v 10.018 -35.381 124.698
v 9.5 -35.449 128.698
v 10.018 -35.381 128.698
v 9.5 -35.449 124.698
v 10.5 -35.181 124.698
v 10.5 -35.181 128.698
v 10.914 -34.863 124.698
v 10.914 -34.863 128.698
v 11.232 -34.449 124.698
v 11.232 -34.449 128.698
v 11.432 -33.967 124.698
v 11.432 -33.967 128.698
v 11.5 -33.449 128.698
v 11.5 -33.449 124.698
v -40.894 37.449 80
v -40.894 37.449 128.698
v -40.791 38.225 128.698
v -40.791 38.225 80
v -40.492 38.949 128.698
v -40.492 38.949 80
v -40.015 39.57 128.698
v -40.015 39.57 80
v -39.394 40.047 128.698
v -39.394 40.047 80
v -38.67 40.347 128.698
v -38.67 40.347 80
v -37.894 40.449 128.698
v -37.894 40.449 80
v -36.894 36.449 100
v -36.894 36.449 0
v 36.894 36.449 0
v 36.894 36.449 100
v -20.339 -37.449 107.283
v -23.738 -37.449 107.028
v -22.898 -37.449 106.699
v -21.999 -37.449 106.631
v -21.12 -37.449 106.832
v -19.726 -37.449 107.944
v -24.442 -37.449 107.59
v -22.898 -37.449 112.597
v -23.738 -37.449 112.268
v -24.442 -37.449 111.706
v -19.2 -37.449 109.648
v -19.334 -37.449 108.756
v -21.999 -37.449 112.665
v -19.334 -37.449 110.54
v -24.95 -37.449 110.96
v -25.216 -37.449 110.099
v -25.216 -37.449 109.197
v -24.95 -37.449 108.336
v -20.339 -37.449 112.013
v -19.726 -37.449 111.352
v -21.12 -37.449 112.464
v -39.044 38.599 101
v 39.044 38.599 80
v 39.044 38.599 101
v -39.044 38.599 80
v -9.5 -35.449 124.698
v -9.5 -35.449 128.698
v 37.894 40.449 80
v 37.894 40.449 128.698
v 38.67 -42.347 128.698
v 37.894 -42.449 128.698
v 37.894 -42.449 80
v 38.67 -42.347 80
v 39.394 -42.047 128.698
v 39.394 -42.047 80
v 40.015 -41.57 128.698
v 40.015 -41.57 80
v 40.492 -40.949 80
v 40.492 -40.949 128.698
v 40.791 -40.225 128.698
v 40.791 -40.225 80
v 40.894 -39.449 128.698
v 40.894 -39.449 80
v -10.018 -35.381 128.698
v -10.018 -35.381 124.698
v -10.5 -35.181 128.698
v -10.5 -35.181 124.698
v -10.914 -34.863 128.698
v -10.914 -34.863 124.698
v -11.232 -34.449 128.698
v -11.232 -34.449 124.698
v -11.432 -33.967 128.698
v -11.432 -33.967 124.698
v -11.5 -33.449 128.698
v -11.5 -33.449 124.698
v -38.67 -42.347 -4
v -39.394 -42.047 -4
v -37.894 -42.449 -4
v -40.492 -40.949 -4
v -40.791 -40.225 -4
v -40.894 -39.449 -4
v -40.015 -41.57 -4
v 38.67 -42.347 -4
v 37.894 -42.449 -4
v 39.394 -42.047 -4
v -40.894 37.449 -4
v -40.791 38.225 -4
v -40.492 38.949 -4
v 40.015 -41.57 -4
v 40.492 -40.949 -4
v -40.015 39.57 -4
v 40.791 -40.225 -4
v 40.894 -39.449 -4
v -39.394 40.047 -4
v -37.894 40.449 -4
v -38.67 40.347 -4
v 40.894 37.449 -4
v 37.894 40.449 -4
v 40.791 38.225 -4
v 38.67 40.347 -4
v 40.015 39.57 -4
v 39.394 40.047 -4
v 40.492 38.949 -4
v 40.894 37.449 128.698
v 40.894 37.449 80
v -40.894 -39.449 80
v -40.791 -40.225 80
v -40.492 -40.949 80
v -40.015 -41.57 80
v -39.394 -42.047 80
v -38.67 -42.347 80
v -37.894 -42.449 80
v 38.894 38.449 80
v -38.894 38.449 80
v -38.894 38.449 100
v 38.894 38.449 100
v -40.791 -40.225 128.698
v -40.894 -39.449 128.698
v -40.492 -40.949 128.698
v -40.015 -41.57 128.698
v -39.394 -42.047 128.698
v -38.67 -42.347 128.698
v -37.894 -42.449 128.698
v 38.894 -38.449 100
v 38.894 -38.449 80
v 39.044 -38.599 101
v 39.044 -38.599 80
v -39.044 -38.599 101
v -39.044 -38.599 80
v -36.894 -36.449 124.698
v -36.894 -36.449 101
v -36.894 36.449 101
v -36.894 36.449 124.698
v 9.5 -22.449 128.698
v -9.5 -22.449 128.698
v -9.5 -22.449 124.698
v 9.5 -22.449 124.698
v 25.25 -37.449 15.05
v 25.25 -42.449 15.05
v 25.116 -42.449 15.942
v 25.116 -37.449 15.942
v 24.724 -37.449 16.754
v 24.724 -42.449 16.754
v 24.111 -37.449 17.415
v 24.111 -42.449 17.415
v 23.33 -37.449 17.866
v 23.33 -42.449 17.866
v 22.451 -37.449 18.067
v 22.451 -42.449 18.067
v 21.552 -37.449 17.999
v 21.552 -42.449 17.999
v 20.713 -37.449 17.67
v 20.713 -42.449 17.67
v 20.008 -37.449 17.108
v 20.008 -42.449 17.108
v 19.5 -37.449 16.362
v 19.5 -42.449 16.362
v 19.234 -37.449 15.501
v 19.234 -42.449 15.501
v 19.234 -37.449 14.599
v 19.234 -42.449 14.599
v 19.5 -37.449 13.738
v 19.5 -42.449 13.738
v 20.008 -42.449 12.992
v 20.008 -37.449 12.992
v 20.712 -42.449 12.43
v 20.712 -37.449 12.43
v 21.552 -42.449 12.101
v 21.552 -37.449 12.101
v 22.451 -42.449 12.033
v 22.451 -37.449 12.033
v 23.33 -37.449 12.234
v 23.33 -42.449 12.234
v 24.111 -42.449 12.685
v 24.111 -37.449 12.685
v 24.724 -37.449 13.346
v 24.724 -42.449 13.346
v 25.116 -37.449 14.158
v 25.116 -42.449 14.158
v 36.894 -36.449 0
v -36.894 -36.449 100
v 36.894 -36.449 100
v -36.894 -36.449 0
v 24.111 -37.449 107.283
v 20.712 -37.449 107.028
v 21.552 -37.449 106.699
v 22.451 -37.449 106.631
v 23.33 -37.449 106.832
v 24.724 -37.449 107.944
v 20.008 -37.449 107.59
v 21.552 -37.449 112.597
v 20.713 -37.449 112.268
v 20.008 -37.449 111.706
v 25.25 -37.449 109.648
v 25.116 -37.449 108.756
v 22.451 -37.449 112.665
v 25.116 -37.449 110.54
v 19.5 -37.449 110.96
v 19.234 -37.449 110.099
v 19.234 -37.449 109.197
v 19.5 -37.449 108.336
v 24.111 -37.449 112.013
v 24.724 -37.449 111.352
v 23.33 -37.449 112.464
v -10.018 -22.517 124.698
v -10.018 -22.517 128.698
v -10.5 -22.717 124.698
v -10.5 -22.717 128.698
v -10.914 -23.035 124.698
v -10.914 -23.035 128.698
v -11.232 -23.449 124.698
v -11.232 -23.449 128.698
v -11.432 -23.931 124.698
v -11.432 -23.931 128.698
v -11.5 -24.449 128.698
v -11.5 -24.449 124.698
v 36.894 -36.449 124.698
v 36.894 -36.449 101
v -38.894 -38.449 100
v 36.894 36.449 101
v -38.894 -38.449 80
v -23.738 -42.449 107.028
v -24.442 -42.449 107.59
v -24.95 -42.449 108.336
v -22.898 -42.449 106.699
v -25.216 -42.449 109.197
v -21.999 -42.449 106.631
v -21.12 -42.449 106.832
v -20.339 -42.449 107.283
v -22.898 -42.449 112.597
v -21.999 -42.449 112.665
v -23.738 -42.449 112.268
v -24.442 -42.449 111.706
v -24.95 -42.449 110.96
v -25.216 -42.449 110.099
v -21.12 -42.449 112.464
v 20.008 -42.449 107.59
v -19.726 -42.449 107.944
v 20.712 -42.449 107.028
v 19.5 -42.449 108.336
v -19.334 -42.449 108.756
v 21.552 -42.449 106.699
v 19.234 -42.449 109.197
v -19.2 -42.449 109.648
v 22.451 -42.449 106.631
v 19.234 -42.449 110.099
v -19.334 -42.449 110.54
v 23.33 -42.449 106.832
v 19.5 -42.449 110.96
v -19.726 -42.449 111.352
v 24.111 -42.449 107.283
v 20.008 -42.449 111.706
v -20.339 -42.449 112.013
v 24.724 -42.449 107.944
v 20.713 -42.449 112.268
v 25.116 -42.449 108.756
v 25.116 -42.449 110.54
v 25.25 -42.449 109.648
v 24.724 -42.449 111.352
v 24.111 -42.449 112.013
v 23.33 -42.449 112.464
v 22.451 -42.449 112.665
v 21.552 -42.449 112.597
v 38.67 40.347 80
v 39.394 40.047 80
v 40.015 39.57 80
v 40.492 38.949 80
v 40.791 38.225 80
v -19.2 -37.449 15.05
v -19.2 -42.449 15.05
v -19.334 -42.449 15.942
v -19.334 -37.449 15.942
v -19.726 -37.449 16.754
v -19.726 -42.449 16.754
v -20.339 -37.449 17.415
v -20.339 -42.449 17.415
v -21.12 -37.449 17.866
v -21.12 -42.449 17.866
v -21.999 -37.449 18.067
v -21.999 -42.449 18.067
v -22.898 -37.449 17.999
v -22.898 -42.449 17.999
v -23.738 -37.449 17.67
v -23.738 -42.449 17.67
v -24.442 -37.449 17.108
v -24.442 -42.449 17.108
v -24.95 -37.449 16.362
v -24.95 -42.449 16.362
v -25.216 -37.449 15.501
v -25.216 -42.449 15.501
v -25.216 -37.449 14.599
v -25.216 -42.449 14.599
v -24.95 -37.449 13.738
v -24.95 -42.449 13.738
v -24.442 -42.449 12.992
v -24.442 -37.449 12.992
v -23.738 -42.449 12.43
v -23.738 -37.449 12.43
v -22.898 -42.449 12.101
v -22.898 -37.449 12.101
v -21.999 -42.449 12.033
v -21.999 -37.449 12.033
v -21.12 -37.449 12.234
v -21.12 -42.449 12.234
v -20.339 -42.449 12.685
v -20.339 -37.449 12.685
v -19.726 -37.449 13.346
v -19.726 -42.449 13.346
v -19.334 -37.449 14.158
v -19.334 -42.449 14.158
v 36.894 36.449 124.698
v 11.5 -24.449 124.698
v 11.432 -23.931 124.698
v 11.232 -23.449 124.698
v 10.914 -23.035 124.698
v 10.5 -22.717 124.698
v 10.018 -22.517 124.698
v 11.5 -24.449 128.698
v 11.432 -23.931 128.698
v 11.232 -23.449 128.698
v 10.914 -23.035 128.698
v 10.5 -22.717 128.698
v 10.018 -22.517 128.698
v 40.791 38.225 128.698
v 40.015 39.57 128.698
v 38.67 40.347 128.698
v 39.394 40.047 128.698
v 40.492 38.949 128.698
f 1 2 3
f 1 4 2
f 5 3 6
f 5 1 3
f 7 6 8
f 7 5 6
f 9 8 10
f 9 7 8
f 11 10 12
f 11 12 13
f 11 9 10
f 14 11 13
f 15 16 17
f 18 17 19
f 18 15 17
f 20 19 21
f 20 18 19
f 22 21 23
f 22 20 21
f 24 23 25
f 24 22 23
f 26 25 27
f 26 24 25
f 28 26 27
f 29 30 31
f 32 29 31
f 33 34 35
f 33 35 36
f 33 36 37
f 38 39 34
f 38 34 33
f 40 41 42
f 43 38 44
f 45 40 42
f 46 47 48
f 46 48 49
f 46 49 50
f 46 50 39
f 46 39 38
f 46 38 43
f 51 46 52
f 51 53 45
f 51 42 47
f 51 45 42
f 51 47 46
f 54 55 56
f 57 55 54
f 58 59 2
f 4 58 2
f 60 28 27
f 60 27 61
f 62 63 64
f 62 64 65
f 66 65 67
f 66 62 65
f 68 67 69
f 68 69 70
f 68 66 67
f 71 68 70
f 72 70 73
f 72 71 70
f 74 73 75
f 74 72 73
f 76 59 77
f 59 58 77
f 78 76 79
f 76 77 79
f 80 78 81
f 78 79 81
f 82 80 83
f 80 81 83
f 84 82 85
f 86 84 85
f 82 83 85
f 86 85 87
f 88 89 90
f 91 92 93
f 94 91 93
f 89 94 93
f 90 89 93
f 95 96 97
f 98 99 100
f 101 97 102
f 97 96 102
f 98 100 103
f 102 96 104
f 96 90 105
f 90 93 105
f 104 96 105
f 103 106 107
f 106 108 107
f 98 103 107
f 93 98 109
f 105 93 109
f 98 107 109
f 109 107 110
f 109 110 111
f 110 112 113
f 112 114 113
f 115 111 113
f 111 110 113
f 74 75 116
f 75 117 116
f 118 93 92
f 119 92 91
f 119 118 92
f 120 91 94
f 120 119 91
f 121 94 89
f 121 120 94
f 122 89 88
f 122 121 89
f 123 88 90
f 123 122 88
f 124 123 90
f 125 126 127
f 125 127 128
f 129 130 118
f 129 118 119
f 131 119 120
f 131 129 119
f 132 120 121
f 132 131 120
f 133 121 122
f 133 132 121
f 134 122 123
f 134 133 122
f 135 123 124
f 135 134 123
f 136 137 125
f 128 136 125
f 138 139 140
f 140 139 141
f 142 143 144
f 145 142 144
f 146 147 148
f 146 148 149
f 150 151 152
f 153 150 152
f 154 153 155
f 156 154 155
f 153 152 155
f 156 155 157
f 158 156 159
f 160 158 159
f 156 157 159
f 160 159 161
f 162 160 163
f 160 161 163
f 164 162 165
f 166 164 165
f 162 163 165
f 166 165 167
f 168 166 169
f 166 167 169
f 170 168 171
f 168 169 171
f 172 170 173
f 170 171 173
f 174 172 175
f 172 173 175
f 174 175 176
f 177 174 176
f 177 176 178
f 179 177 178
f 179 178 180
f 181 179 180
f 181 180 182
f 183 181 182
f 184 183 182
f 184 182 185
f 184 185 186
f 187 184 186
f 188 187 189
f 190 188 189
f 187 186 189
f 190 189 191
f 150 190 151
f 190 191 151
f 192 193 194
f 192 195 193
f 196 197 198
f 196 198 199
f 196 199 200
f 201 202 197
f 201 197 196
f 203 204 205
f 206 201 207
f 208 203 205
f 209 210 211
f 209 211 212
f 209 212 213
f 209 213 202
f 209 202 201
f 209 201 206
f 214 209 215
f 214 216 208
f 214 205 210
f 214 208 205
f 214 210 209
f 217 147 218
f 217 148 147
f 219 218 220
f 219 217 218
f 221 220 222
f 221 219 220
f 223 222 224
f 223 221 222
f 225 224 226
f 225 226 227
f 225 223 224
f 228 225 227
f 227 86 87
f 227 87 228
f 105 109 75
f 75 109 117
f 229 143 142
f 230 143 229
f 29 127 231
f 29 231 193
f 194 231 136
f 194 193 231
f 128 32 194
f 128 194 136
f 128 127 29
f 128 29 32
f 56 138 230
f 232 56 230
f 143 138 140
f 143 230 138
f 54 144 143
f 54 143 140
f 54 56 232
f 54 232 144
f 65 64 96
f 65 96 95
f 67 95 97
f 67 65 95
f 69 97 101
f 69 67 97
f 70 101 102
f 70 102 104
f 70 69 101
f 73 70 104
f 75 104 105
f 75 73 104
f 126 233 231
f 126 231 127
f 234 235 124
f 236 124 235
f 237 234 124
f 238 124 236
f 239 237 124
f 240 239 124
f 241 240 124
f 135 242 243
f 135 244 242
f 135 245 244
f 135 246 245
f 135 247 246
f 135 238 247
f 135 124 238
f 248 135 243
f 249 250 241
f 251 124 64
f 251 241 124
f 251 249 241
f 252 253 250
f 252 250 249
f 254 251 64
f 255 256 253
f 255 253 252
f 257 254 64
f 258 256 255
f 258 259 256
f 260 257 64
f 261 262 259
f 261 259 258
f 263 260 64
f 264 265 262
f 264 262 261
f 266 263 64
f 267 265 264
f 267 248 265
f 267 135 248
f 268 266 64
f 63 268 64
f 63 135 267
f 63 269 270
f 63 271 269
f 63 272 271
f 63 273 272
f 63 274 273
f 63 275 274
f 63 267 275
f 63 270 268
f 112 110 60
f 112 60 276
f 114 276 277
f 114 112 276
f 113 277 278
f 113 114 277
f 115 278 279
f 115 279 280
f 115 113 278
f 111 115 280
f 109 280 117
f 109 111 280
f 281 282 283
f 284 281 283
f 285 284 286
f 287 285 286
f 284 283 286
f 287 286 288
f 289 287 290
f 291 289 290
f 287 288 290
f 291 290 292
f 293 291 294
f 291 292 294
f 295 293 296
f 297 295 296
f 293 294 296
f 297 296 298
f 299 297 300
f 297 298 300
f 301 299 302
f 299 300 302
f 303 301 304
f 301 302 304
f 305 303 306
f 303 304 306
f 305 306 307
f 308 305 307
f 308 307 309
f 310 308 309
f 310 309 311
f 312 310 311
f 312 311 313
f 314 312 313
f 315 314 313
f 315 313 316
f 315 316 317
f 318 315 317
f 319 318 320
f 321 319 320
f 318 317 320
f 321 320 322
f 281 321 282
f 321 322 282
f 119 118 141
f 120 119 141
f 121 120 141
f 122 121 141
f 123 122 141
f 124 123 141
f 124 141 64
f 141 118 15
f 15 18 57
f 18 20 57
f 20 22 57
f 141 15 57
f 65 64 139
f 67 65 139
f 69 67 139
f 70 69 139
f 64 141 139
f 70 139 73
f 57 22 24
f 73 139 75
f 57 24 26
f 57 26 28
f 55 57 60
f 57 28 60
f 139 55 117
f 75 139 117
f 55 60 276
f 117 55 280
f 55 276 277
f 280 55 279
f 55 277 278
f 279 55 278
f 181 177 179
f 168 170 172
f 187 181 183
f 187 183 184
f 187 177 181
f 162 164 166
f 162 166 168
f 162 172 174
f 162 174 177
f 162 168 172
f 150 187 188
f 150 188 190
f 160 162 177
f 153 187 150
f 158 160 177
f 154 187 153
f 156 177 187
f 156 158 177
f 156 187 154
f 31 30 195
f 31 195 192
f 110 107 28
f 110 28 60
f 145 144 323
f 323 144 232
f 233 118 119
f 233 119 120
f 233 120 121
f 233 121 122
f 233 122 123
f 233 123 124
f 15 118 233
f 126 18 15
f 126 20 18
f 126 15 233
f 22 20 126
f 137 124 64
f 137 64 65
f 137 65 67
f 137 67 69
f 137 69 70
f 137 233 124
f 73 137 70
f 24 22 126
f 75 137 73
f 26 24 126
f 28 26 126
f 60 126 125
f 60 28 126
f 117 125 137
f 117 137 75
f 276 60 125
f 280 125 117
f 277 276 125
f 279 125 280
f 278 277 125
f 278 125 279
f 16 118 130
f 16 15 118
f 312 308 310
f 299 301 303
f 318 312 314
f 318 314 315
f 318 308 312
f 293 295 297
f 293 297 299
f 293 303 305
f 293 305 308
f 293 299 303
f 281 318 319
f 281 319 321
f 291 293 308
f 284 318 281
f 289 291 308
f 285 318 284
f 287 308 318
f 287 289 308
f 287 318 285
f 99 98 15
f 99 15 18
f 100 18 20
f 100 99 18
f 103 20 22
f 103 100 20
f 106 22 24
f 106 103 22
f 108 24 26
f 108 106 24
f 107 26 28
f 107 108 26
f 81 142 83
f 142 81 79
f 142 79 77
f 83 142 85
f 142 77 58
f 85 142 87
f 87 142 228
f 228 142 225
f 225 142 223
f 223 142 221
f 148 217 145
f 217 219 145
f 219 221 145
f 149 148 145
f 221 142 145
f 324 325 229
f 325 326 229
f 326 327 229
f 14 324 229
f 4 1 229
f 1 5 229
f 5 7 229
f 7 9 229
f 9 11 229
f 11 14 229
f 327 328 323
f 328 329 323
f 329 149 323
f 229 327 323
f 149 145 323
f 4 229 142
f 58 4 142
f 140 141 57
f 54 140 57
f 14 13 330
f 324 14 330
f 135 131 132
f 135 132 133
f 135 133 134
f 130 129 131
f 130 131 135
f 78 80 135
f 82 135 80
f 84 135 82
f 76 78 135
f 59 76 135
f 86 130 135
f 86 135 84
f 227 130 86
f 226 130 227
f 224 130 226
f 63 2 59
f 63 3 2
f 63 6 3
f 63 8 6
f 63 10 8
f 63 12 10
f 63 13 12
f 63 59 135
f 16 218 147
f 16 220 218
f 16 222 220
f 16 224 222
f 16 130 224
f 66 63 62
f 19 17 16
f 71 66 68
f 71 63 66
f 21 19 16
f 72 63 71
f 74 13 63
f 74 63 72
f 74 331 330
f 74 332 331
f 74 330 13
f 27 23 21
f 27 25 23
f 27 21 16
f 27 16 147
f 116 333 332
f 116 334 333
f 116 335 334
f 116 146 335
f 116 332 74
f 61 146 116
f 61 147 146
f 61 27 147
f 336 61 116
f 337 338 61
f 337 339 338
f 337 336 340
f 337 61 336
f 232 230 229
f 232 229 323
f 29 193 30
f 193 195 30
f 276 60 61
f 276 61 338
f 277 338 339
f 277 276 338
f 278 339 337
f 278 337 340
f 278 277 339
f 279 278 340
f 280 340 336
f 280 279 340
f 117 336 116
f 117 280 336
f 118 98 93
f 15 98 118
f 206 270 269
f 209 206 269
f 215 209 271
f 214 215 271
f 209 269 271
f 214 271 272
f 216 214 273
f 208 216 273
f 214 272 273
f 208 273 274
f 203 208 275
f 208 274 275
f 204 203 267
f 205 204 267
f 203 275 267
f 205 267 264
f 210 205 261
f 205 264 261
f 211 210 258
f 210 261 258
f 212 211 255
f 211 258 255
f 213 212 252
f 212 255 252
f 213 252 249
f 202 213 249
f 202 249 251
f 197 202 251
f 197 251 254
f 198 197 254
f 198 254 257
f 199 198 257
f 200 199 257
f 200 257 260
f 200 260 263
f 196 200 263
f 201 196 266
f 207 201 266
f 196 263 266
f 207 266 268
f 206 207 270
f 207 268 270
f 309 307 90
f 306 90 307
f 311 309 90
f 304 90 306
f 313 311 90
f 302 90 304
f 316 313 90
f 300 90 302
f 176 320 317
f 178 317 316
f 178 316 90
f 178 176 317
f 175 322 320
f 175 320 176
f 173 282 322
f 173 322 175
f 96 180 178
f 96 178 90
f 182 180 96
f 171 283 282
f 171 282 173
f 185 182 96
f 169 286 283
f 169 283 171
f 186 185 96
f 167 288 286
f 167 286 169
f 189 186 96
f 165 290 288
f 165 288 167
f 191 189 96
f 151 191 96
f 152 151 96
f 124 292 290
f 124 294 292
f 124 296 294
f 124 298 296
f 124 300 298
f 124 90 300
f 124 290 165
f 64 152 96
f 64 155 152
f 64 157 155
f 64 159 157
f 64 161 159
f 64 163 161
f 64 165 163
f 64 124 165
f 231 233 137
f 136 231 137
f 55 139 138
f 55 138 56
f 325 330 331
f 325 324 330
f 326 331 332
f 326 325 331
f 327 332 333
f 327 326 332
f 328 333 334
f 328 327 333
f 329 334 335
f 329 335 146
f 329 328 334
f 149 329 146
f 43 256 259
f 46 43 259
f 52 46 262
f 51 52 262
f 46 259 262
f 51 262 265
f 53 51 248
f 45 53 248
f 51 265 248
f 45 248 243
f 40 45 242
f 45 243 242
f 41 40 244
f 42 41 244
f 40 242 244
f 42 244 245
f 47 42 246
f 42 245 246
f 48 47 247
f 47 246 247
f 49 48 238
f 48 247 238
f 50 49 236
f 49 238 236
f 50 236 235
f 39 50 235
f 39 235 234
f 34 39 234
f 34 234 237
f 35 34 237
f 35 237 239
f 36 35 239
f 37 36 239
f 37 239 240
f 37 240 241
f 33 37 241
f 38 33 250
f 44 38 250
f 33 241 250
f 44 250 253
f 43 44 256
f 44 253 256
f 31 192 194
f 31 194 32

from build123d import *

# Parameters (mm, degrees)
SKETCH1_W           = 73.787
SKETCH1_H           = 72.898
BOSS_EXTRUDE1_DEPTH = 123.698
SHELL1_T            = 4
SKETCH2_W           = 81.787
SKETCH2_H           = 80.898
SKETCH2_W_2         = 73.787
SKETCH2_H_2         = 72.898
BOSS_EXTRUDE2_DEPTH = 1
SKETCH7_W           = 81.787
SKETCH7_H           = 80.898
BOSS_EXTRUDE5_DEPTH = 4
SKETCH3_W           = 81.787
SKETCH3_H           = 132.698
BOSS_EXTRUDE3_DEPTH = 2
SKETCH4_R           = 3.025
CUT_EXTRUDE2_DEPTH  = 5
FILLET1_R           = 3
SKETCH5_W           = 77.787
SKETCH5_H           = 76.898
SKETCH5_W_2         = 73.787
SKETCH5_H_2         = 72.898
BOSS_EXTRUDE4_DEPTH = 20
SKETCH6_W           = 78.087
SKETCH6_H           = 77.198
CUT_EXTRUDE3_DEPTH  = 21
SKETCH8_W           = 23
SKETCH8_H           = 13
CUT_EXTRUDE4_DEPTH  = 10
FILLET2_R           = 2


with BuildPart() as part:
    # Sketch1 → Boss-Extrude1 (new body)
    with BuildSketch(Plane.XY):
        Rectangle(SKETCH1_W, SKETCH1_H)
    extrude(amount=BOSS_EXTRUDE1_DEPTH)

    # Shell1
    shell1_openings = [part.faces().sort_by_distance(p)[0] for p in [
        (0, 0, 123.698),
    ]]
    offset(amount=SHELL1_T, openings=shell1_openings, kind=Kind.INTERSECTION)

    # Sketch2 → Boss-Extrude2 (add)
    with BuildSketch(Plane.XY.offset(123.698)):
        Rectangle(SKETCH2_W, SKETCH2_H)
        Rectangle(SKETCH2_W_2, SKETCH2_H_2, mode=Mode.SUBTRACT)
    extrude(amount=BOSS_EXTRUDE2_DEPTH)

    # Sketch7 → Boss-Extrude5 (add)
    with BuildSketch(Plane.XY.offset(124.698)):
        Rectangle(SKETCH7_W, SKETCH7_H)
    extrude(amount=BOSS_EXTRUDE5_DEPTH)

    # Sketch3 → Boss-Extrude3 (add)
    with BuildSketch(Plane.XZ.offset(40.449)):
        with Locations((0, 62.349)):
            Rectangle(SKETCH3_W, SKETCH3_H)
    extrude(amount=BOSS_EXTRUDE3_DEPTH)

    # Sketch4 → Cut-Extrude2 (cut)
    with BuildSketch(Plane.XZ.offset(42.449)):
        with Locations((-22.225, 109.648)):
            Circle(SKETCH4_R)
        with Locations((22.225, 109.648)):
            Circle(SKETCH4_R)
        with Locations((-22.225, 15.05)):
            Circle(SKETCH4_R)
        with Locations((22.225, 15.05)):
            Circle(SKETCH4_R)
    extrude(amount=-CUT_EXTRUDE2_DEPTH, mode=Mode.SUBTRACT)

    # Fillet1
    fillet1_edges = [part.edges().sort_by_distance(p)[0] for p in [
        (-40.8935, -42.449, 62.349),
        (40.8935, -42.449, 62.349),
        (40.8935, 40.449, 62.349),
        (-40.8935, 40.449, 62.349),
    ]]
    fillet(fillet1_edges, radius=FILLET1_R)


with BuildPart() as body_2:
    # Split1: the piece on the far side of the plane
    add(part.part)
    split(bisect_by=Plane.XY.offset(80), keep=Keep.BOTTOM)

    # Sketch5 → Boss-Extrude4 (add)
    with BuildSketch(Plane.XY.offset(80)):
        Rectangle(SKETCH5_W, SKETCH5_H)
        Rectangle(SKETCH5_W_2, SKETCH5_H_2, mode=Mode.SUBTRACT)
    extrude(amount=BOSS_EXTRUDE4_DEPTH)


with BuildPart() as part_1:
    add(part.part)

    # Split1
    split(bisect_by=Plane.XY.offset(80), keep=Keep.TOP)

    # Sketch6 → Cut-Extrude3 (cut)
    with BuildSketch(Plane(origin=(0, 0, 80), x_dir=(-1, 0, 0), z_dir=(0, 0, -1))):
        Rectangle(SKETCH6_W, SKETCH6_H)
    extrude(amount=-CUT_EXTRUDE3_DEPTH, mode=Mode.SUBTRACT)

    # Sketch8 → Cut-Extrude4 (cut)
    with BuildSketch(Plane.XY.offset(128.698)):
        with Locations((0, -28.949)):
            Rectangle(SKETCH8_W, SKETCH8_H)
    extrude(amount=-CUT_EXTRUDE4_DEPTH, mode=Mode.SUBTRACT)

    # Fillet2
    fillet2_edges = [part_1.edges().sort_by_distance(p)[0] for p in [
        (11.5, -22.449, 126.698),
        (11.5, -35.449, 126.698),
        (-11.5, -35.449, 126.698),
        (-11.5, -22.449, 126.698),
    ]]
    fillet(fillet2_edges, radius=FILLET2_R)


solid = Compound([body_2.part, part_1.part])
